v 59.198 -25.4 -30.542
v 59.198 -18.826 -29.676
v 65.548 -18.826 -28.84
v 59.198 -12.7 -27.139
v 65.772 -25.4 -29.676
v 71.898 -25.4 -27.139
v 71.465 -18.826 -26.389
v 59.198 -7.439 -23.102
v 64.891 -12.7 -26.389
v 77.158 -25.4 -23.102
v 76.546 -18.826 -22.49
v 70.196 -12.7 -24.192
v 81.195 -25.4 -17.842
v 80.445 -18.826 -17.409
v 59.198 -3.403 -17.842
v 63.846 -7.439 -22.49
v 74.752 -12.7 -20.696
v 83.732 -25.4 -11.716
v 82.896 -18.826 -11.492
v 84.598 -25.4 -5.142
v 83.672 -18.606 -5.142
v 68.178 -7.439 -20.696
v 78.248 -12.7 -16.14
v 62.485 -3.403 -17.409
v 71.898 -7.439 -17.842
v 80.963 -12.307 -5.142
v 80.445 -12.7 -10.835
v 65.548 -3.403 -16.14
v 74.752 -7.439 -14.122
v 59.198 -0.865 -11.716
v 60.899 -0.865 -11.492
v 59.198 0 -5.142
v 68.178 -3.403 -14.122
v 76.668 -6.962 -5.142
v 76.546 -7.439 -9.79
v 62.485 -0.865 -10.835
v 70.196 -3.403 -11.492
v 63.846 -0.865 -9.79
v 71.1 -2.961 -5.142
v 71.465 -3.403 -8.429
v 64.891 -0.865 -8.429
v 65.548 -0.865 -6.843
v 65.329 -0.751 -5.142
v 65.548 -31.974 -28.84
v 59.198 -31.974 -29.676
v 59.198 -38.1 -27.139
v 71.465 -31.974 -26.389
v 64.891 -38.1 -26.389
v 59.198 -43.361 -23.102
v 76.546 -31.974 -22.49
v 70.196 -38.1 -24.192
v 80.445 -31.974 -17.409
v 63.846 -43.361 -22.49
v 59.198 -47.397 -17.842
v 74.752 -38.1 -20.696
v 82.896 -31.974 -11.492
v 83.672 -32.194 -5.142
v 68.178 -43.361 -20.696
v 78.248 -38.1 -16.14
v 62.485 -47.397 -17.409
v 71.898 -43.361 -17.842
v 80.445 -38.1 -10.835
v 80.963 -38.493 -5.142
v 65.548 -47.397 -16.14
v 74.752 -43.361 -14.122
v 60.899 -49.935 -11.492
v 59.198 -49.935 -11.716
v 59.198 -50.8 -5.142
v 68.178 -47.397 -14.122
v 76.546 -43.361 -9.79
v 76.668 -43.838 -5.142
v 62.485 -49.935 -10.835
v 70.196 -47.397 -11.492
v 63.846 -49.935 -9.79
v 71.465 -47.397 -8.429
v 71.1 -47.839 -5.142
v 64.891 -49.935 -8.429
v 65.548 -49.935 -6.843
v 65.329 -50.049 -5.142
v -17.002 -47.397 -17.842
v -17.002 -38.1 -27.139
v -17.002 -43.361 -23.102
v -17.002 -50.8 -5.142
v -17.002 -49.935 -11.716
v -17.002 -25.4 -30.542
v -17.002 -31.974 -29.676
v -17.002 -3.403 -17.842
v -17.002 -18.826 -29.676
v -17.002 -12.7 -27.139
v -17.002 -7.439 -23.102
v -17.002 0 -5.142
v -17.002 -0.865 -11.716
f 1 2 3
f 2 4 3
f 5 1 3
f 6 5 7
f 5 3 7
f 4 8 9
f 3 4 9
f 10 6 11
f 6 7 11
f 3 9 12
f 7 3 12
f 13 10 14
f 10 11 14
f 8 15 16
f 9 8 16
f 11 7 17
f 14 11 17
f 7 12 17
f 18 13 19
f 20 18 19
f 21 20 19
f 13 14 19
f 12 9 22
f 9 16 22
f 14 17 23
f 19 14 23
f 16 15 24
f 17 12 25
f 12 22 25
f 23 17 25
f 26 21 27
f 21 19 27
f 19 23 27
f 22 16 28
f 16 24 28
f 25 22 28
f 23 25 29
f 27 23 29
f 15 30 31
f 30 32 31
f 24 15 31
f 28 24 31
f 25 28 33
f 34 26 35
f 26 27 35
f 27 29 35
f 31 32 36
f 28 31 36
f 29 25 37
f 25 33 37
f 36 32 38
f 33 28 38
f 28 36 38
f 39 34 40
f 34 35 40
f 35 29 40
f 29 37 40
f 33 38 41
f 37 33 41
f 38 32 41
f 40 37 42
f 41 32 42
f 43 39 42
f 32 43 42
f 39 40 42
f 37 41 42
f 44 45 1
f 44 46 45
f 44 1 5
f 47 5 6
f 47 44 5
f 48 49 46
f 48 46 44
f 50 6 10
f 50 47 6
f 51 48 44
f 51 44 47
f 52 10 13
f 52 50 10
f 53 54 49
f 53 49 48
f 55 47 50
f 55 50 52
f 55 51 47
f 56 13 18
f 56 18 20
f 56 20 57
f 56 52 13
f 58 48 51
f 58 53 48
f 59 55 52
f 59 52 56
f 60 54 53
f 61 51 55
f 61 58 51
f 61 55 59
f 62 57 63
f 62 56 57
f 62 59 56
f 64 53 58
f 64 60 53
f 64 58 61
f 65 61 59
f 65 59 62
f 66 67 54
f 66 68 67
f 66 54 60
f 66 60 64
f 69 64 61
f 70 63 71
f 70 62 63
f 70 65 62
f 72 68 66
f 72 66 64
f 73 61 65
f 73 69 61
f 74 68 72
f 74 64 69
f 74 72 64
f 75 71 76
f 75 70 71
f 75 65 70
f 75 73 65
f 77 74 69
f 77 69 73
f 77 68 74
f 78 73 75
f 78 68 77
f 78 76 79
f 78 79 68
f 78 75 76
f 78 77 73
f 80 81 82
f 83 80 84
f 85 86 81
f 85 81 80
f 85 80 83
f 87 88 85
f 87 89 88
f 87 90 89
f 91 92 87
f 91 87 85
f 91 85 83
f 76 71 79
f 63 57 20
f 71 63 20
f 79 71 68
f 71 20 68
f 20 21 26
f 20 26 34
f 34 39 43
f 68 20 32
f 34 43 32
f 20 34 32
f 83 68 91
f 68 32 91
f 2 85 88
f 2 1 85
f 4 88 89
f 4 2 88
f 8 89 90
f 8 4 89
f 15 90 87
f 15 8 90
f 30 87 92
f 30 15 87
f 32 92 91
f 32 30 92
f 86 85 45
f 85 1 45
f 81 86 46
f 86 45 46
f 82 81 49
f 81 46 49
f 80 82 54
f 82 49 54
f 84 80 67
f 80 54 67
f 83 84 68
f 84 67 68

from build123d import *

# Parameters (mm, degrees)
F0_W     = 76.2
F0_H     = 25.4
F1_DEPTH = 50.8
F2_R     = 25.39999
F3_R     = 25.39999


# Not quite as in the source:
# - a fillet or chamfer is up to 0.001 mm smaller than in the source, because OpenCascade refuses the exact size


with BuildPart() as f1:
    # F0 (on Front) → F1 (new body)
    with BuildSketch(Plane.XZ):
        with Locations((21.0978503615, -17.8415966735)):
            Rectangle(F0_W, F0_H)
        with BuildLine():
            Line((84.5978503615, -5.1415966735), (59.1978503615, -5.1415966735))
            Line((59.1978503615, -5.1415966735), (59.1978503615, -30.5415966735))
            ThreePointArc((59.1978503615, -30.5415966735), (77.1583626036, -23.1021089156), (84.5978503615, -5.1415966735))
        make_face()
    extrude(amount=F1_DEPTH)

    # F2 (radius 25.4 in the source; OpenCascade refuses exactly that, so slightly less here)
    f2_edges = [f1.edges().sort_by_distance(p)[0] for p in [
        (21.09785, -50.8, -30.541597),
    ]]
    fillet(f2_edges, radius=F2_R)

    # F3 (radius 25.4 in the source; OpenCascade refuses exactly that, so slightly less here)
    f3_edges = [f1.edges().sort_by_distance(p)[0] for p in [
        (21.09785, 0, -30.541597),
    ]]
    fillet(f3_edges, radius=F3_R)


solid = f1.part
